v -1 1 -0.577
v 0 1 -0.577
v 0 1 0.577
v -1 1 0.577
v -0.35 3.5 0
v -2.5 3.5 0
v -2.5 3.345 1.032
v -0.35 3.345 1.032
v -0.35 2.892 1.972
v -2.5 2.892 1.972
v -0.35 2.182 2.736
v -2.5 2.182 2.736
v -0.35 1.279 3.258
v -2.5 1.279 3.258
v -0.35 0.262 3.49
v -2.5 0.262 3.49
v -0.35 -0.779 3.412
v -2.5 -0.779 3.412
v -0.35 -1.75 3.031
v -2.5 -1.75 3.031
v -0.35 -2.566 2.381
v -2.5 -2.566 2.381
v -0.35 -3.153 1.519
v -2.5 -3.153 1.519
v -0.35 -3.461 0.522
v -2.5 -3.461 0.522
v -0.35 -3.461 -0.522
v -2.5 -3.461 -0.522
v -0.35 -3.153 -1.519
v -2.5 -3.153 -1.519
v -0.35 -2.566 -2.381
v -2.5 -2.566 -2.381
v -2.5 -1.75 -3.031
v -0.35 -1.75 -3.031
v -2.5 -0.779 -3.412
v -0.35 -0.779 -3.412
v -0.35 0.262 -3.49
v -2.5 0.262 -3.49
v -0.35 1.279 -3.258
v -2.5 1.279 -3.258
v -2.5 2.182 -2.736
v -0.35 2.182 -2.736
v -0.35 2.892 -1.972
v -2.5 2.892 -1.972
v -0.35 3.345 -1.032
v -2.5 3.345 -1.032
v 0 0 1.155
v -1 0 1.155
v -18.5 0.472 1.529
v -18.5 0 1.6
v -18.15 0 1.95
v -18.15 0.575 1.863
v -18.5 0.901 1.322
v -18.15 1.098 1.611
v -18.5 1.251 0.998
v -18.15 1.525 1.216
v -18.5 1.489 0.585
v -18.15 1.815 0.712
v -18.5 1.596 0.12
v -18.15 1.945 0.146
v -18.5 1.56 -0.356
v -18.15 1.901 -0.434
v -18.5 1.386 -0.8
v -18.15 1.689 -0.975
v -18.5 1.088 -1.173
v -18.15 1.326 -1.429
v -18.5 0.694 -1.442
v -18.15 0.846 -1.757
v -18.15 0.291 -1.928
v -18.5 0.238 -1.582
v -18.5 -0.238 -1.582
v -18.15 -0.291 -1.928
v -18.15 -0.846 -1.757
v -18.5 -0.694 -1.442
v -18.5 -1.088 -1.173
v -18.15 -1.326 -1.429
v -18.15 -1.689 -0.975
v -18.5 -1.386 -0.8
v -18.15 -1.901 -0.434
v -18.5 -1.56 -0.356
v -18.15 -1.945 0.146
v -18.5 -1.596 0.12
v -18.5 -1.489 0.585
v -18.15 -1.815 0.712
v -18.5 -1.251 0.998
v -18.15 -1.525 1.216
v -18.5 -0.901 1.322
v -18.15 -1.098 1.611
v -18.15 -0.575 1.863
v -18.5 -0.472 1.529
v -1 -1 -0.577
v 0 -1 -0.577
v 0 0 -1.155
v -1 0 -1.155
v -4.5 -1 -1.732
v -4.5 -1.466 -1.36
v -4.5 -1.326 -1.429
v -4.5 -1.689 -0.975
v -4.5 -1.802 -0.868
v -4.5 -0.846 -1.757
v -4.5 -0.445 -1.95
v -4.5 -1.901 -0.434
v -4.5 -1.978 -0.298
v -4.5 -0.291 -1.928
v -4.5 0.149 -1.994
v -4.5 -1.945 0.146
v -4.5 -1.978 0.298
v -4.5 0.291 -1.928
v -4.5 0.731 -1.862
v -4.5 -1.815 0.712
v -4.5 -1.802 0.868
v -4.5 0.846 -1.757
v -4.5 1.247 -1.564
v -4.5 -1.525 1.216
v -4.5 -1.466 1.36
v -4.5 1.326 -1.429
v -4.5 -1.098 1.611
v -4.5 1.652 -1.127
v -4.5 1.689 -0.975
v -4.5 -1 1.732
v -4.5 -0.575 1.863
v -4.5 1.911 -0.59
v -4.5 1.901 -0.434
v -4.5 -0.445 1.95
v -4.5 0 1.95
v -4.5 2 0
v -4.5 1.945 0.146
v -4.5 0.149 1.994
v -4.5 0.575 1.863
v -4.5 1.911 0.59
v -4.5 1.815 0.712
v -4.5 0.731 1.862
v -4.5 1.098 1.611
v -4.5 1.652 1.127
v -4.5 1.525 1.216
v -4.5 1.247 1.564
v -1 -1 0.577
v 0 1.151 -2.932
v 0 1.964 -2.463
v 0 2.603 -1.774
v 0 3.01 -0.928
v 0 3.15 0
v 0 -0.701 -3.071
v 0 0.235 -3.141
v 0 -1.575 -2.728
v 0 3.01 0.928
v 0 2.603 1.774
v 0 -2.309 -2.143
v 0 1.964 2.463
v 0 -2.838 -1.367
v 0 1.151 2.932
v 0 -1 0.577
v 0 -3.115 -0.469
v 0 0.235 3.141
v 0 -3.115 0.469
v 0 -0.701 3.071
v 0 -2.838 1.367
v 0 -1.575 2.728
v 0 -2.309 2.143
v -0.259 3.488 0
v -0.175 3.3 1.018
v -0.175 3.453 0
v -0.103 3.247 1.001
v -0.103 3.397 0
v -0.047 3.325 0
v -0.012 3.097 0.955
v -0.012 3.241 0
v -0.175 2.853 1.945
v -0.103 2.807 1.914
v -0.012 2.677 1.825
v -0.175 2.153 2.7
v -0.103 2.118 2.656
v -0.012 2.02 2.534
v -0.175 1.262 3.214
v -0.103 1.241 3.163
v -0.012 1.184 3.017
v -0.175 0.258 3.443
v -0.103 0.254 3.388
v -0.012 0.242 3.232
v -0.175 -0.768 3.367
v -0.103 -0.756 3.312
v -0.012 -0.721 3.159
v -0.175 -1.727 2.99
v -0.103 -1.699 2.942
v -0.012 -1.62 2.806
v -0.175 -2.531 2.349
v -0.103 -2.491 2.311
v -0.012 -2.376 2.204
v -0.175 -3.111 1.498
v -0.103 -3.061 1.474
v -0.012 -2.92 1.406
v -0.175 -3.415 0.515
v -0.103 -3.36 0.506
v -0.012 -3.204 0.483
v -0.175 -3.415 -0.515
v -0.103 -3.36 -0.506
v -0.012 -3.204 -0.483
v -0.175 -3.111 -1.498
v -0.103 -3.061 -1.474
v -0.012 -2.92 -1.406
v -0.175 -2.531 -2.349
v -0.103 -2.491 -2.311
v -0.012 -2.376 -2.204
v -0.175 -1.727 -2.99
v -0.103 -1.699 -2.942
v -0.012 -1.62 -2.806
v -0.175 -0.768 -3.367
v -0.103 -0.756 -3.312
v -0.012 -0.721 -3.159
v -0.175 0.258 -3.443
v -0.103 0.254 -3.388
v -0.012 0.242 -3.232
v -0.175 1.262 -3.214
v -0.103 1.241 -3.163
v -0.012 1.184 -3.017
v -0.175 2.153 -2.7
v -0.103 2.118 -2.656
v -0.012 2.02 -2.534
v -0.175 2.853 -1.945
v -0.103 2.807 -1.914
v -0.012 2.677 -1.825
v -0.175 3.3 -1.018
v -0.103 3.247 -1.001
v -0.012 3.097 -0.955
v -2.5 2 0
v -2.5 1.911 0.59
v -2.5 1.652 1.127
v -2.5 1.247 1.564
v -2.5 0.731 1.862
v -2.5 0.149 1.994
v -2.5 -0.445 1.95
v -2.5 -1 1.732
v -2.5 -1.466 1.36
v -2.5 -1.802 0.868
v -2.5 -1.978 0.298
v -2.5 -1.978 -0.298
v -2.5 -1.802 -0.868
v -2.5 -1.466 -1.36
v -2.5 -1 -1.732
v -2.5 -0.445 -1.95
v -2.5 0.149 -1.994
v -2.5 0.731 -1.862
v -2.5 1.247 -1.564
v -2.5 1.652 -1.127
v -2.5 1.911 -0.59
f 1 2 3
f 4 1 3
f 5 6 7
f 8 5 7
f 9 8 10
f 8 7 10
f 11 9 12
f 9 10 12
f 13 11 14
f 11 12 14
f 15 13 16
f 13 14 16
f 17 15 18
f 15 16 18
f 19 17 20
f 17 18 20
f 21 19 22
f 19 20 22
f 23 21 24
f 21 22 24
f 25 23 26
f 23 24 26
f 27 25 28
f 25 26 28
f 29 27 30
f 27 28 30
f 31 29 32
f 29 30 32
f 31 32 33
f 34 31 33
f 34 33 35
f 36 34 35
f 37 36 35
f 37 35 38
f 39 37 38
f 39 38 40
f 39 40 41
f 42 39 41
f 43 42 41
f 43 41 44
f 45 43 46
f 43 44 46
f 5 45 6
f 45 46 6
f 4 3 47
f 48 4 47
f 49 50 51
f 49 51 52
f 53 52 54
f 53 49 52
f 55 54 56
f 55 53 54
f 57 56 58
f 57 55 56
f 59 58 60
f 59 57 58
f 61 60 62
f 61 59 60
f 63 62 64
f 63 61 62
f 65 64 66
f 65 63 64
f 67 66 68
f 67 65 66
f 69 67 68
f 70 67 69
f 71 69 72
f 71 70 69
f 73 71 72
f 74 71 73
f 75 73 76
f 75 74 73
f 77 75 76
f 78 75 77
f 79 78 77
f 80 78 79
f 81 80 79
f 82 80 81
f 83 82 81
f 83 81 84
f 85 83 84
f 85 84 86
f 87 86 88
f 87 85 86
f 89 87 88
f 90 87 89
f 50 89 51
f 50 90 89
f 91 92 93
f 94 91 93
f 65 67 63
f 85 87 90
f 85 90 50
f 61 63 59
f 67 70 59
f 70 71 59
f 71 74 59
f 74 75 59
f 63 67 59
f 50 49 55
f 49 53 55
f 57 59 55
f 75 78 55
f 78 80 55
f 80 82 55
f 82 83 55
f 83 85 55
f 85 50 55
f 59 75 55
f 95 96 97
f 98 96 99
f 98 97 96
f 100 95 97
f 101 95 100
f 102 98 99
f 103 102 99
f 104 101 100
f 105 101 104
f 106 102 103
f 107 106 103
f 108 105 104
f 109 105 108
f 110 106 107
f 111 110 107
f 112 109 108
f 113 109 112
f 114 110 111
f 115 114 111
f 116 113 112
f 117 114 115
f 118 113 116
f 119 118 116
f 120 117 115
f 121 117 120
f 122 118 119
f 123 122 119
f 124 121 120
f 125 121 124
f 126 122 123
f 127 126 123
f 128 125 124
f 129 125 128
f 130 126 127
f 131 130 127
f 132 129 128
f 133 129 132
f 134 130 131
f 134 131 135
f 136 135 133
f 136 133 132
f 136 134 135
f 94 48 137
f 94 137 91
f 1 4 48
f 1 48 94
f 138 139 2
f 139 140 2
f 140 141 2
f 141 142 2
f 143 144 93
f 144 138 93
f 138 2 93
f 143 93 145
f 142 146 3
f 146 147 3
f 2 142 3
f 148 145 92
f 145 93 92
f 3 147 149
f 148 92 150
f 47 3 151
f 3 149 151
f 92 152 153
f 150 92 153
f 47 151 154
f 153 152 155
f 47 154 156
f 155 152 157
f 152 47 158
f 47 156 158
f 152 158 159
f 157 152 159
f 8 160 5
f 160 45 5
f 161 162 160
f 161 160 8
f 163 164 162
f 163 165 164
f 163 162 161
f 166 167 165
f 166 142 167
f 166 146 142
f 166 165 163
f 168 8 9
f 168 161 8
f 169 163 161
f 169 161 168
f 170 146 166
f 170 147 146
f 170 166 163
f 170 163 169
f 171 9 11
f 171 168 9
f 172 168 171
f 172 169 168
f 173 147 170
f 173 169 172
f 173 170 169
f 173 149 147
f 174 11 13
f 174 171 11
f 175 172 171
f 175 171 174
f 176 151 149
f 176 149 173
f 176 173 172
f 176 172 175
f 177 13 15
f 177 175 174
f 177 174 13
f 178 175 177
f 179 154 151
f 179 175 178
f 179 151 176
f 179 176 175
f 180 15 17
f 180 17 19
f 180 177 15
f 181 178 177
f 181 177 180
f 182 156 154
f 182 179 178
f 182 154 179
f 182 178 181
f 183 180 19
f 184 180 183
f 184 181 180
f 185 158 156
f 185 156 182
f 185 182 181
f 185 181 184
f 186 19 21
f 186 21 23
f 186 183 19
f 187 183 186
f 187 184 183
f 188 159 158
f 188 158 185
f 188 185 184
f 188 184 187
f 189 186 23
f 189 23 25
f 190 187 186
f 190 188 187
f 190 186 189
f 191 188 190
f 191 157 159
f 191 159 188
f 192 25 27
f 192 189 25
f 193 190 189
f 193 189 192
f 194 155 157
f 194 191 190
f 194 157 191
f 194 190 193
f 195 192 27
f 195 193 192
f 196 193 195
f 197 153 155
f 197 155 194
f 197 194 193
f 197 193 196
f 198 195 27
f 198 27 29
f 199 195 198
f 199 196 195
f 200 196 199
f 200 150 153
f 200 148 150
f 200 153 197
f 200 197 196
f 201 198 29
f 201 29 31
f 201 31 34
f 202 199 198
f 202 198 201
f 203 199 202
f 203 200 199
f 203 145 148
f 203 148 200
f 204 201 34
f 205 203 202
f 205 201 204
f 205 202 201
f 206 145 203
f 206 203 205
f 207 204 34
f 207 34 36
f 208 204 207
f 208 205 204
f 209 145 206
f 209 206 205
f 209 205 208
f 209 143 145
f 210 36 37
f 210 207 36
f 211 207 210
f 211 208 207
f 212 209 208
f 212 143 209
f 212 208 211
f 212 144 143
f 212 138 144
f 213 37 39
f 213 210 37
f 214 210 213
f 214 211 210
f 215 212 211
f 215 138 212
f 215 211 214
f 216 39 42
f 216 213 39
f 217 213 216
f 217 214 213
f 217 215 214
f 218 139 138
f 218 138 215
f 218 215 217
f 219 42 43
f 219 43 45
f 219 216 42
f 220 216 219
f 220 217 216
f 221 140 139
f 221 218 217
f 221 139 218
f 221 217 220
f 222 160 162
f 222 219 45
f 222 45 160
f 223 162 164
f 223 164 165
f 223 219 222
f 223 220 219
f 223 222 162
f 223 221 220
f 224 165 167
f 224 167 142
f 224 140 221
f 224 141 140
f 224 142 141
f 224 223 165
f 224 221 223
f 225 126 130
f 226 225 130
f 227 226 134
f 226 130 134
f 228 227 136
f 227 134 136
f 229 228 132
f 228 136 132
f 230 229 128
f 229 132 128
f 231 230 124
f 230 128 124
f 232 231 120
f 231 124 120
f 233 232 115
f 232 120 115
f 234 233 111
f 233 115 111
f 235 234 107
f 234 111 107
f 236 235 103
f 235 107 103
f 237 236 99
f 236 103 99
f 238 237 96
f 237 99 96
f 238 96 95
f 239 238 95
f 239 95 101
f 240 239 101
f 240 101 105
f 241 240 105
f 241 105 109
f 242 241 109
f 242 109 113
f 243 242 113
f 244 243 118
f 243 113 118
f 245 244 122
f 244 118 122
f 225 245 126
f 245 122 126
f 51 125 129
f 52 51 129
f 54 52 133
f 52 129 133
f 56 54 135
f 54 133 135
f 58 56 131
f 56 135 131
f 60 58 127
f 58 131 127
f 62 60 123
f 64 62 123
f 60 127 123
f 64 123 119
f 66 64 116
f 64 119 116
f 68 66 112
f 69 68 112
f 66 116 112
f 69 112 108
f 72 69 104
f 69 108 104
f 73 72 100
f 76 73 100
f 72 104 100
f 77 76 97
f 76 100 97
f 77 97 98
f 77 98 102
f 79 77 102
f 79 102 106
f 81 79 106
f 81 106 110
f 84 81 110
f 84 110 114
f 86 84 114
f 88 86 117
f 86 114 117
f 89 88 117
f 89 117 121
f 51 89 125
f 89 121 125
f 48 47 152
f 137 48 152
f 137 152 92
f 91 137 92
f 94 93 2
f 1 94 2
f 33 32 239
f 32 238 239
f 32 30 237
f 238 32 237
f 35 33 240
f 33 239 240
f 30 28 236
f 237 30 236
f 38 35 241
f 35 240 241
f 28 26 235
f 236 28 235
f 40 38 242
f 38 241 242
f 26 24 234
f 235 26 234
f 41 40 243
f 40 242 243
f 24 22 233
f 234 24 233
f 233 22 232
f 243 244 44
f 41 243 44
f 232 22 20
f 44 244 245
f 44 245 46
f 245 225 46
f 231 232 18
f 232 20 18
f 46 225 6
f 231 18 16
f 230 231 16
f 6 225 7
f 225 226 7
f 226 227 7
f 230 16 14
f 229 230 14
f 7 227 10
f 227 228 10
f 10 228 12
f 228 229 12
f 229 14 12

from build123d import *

# Parameters (mm, degrees)
SZKIC4_W                   = 14
SZKIC4_H                   = 0.05
SFAZOWANIE1_SIZE           = 0.35
ZAOKR_GLENIE1_R            = 0.35
WYTNIJ_WYCI_GNI_CIE1_DEPTH = 1


with BuildPart() as part:
    # Szkic1 → Obrót1 (revolve)
    with BuildSketch(Plane.XY):
        Polygon((0, 0), (0, 3.5), (-2.5, 3.5), (-2.5, 2), (-18.5, 2), (-18.5, 0), align=None)
    revolve(axis=Axis((-123.158940217, 0, 0), (1, 0, 0)))

    # Szkic4 → Wycięcie-obrót1 (revolve, cut)
    with BuildSketch(Plane(origin=(0, 0, 0), x_dir=(1, 0, 0), z_dir=(0, 1, 0))):
        with Locations((-11.5, -1.975)):
            Rectangle(SZKIC4_W, SZKIC4_H)
    revolve(axis=Axis((0, 0, 0), (-1, 0, 0)), mode=Mode.SUBTRACT)

    # Sfazowanie1
    sfazowanie1_edges = [part.edges().sort_by_distance(p)[0] for p in [
        (-18.5, 0, -1.95),
    ]]
    chamfer(sfazowanie1_edges, length=SFAZOWANIE1_SIZE)

    # Zaokrąglenie1
    zaokr_glenie1_edges = [part.edges().sort_by_distance(p)[0] for p in [
        (0, -3.5, 0),
    ]]
    fillet(zaokr_glenie1_edges, radius=ZAOKR_GLENIE1_R)

    # Szkic2 → Wytnij-wyciągnięcie1 (cut)
    with BuildSketch(Plane(origin=(0, 0, 0), x_dir=(0, 0, -1), z_dir=(1, 0, 0))):
        Polygon((1.154700538, 0), (0.577350269, 1), (-0.577350269, 1), (-1.154700538, 0), (-0.577350269, -1), (0.577350269, -1), align=None)
    extrude(amount=-WYTNIJ_WYCI_GNI_CIE1_DEPTH, mode=Mode.SUBTRACT)


solid = part.part
